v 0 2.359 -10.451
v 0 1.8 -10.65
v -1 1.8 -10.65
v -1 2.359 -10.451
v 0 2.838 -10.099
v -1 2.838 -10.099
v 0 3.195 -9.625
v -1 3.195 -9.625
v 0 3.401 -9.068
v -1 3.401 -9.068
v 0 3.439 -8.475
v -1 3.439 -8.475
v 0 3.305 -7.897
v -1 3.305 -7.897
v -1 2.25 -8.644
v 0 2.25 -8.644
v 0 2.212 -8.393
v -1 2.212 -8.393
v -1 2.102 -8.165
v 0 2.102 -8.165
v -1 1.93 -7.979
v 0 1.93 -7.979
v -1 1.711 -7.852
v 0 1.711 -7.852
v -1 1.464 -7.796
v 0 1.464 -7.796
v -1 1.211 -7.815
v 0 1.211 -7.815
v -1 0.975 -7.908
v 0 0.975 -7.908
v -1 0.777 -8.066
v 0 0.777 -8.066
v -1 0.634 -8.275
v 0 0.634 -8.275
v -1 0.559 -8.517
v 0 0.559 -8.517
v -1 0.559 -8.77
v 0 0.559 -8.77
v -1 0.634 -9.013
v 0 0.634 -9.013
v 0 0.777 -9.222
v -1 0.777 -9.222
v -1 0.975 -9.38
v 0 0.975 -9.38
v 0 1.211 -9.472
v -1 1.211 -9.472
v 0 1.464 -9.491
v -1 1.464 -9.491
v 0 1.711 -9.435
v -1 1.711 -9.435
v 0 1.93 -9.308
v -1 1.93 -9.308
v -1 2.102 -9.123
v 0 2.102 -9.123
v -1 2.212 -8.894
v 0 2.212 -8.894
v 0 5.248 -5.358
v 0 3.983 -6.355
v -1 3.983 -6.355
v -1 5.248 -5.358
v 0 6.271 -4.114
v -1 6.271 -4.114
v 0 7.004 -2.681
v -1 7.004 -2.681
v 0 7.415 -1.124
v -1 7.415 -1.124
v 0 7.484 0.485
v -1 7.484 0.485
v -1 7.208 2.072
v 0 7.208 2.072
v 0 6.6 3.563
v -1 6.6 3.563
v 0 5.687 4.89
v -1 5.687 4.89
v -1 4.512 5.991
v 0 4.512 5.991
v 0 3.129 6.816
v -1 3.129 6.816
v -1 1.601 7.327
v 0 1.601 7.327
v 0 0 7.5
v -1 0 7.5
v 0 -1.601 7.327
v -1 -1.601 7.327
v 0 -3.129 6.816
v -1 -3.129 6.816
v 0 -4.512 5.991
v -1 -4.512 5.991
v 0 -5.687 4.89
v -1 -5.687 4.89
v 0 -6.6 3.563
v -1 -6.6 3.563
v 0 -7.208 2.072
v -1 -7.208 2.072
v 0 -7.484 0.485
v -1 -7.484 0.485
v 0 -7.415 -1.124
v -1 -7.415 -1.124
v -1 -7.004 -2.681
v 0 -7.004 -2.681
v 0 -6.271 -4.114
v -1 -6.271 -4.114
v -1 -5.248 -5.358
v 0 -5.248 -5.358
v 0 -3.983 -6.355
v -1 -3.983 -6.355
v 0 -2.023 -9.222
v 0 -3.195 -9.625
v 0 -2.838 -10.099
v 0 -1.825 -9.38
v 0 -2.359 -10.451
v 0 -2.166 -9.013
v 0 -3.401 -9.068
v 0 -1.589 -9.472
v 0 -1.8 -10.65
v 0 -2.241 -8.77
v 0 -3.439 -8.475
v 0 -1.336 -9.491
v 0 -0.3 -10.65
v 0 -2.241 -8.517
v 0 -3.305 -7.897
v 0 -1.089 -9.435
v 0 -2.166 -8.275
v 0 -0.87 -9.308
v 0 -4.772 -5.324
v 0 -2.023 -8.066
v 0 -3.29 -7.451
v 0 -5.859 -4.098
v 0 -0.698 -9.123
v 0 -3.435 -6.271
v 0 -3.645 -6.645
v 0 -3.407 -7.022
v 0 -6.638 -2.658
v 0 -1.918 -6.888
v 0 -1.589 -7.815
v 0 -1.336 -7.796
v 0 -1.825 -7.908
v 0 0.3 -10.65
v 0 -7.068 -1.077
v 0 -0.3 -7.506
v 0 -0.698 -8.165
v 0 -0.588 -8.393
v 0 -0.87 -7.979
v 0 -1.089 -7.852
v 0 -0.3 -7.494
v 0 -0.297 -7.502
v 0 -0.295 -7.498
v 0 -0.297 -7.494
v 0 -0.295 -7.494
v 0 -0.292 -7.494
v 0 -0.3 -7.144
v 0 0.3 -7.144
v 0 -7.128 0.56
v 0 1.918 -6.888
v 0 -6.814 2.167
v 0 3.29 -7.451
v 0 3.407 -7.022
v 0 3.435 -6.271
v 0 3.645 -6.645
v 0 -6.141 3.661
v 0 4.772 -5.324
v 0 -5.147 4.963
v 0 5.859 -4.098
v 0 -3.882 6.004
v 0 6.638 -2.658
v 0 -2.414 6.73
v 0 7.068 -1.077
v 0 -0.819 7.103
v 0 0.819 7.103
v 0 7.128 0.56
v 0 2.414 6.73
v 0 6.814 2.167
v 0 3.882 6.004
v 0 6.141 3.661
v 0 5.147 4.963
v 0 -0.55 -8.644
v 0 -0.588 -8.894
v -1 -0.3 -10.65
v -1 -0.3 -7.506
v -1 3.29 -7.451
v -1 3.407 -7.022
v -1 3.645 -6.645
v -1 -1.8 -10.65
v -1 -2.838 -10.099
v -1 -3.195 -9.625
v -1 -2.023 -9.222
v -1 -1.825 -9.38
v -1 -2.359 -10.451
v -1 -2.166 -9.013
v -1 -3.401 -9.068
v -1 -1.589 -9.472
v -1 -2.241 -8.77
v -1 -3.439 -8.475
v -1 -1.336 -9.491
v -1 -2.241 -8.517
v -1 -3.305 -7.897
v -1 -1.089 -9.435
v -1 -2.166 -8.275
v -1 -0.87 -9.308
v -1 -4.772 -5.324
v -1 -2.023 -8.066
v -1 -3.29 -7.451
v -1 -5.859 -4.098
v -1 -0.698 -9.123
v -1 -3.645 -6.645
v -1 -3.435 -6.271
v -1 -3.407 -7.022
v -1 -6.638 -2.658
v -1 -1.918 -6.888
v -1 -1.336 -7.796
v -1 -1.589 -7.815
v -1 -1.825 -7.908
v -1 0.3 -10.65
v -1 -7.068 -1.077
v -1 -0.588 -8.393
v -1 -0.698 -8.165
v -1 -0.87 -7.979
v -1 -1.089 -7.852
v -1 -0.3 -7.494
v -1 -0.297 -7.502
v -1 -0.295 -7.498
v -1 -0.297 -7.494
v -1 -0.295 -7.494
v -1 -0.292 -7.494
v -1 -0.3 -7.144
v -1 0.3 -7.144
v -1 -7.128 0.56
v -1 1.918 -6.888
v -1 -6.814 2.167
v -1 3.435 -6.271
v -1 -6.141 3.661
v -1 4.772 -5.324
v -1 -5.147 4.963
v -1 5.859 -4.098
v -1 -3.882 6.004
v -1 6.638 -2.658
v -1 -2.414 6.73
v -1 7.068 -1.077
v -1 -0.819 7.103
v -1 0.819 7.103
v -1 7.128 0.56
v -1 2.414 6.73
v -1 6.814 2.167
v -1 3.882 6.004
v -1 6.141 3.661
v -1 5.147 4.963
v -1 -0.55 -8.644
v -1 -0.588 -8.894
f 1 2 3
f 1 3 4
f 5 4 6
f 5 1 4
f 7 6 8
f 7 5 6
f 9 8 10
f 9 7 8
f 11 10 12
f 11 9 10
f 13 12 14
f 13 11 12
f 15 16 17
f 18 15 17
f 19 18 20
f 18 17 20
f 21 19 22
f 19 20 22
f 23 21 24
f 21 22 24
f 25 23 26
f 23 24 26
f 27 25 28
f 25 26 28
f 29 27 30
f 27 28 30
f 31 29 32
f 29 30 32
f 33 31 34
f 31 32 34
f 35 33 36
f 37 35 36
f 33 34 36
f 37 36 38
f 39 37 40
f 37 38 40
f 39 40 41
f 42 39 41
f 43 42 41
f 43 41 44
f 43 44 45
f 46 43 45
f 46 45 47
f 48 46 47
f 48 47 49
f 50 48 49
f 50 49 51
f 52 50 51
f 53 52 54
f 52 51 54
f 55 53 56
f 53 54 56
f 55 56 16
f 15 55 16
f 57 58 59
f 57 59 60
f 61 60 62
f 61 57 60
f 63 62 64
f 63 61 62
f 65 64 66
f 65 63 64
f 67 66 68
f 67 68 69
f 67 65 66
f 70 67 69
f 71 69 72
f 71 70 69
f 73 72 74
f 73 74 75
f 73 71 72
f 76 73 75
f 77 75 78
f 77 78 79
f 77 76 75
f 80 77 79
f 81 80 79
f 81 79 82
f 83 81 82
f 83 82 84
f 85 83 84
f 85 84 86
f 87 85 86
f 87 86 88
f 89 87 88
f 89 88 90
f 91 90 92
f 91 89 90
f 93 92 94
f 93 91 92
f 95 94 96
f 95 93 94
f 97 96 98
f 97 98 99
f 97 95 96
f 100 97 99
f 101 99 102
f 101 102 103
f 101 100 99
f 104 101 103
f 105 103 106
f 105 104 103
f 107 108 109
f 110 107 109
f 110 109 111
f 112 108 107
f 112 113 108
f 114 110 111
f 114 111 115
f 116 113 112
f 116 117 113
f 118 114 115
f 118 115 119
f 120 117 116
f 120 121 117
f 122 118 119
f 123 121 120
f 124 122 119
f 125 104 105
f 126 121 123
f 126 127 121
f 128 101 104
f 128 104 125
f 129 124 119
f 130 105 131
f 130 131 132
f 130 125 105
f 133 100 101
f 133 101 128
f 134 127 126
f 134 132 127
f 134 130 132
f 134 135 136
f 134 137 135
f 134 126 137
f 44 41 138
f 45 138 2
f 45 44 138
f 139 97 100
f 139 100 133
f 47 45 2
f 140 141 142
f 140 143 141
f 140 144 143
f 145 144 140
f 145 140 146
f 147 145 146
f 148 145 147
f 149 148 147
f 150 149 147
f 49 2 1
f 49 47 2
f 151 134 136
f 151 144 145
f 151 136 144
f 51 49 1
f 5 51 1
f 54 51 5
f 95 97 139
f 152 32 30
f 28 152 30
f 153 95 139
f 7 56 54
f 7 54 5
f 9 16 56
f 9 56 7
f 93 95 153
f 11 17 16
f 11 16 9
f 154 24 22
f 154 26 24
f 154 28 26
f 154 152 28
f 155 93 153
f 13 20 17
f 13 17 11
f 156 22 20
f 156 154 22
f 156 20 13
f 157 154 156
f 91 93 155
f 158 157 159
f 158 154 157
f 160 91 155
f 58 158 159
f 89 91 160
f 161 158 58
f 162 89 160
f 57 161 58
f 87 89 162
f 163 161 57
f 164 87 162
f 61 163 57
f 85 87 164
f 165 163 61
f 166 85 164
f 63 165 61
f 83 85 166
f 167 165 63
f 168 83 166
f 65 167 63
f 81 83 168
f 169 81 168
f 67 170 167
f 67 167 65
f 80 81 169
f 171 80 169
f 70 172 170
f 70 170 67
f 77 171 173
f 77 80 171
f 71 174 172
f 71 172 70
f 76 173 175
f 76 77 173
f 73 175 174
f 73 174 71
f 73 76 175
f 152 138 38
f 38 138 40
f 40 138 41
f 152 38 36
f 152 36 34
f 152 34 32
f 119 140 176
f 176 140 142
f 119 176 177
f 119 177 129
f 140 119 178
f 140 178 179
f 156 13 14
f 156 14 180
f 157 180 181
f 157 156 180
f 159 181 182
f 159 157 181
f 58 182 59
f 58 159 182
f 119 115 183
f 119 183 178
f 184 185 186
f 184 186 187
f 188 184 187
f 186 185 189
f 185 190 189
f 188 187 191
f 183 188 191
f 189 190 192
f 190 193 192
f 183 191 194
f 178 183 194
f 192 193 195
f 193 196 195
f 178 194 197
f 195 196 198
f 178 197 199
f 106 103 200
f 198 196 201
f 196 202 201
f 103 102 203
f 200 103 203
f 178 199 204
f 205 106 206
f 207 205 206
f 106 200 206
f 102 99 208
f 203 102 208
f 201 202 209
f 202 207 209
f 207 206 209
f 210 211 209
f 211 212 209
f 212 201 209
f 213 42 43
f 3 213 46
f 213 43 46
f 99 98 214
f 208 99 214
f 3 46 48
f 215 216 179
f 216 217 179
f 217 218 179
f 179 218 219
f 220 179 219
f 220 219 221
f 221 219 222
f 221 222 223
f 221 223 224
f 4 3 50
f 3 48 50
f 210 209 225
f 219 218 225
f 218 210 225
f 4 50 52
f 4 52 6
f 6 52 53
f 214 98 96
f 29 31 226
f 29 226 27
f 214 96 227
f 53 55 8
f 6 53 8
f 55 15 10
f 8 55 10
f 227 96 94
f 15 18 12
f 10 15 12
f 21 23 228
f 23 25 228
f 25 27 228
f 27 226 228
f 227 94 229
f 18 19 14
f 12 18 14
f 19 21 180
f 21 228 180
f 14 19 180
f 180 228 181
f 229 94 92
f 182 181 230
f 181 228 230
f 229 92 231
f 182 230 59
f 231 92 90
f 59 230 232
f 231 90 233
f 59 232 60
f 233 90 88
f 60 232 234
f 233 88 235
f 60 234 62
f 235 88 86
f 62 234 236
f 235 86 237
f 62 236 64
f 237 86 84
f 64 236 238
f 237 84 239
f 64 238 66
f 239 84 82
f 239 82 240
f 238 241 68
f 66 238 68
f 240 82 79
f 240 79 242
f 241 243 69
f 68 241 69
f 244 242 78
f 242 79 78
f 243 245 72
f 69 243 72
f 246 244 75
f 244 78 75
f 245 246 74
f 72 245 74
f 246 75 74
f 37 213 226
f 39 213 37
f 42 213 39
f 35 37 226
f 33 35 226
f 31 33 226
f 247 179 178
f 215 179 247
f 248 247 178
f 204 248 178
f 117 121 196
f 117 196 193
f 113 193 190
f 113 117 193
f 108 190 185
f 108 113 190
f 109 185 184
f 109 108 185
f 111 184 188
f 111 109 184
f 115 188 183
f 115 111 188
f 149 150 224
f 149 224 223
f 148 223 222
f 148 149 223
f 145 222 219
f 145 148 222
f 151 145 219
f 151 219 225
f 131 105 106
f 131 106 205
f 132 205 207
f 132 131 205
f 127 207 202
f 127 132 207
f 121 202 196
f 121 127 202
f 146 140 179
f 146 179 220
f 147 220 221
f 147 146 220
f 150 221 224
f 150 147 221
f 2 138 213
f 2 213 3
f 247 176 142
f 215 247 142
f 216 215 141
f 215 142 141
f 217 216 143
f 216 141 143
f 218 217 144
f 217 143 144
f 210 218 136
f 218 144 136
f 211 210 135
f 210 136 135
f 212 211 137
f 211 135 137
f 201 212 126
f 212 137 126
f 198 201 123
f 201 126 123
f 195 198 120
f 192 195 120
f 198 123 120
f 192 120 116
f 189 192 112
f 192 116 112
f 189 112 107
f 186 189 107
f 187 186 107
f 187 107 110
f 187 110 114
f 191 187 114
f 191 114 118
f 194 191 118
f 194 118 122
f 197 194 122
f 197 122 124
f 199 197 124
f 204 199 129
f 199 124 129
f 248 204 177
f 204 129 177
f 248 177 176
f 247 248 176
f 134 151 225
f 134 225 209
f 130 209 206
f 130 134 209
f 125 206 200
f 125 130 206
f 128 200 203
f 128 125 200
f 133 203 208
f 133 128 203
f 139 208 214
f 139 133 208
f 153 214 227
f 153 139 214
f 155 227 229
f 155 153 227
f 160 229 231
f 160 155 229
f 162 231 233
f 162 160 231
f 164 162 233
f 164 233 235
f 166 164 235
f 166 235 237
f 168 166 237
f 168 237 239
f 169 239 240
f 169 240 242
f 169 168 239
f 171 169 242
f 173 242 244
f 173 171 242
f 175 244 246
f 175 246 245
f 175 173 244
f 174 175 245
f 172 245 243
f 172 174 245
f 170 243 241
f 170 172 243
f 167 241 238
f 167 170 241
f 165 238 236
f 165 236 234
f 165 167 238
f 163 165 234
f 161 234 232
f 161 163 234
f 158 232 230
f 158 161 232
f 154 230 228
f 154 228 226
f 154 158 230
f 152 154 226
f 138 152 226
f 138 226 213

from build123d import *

# Parameters (mm, degrees)
F0_R     = 0.85
F1_DEPTH = 1


with BuildPart() as f1:
    # F0 (on Right) → F1 (new body)
    with BuildSketch(Plane.YZ):
        with BuildLine():
            ThreePointArc((-0.3, -7.143704), (0, 7.15), (0.3, -7.143704))
            Line((0.3, -7.143704), (0.3, -10.65))
            Line((0.3, -10.65), (1.8, -10.65))
            ThreePointArc((1.8, -10.65), (3.195251, -9.624672), (3.304501, -7.896642))
            ThreePointArc((3.304501, -7.896642), (3.40666, -7.021654), (3.982704, -6.355161))
            ThreePointArc((3.982704, -6.355161), (0, 7.5), (-3.982704, -6.355161))
            ThreePointArc((-3.982704, -6.355161), (-3.40666, -7.021654), (-3.304501, -7.896642))
            ThreePointArc((-3.304501, -7.896642), (-3.195251, -9.624672), (-1.8, -10.65))
            Line((-1.8, -10.65), (-0.3, -10.65))
            Line((-0.3, -10.65), (-0.3, -7.505624))
            Line((-0.3, -7.505624), (-0.3, -7.493998))
            Line((-0.3, -7.493998), (-0.3, -7.143704))
        make_face()
        with Locations((-1.4, -8.643704)):
            Circle(F0_R, mode=Mode.SUBTRACT)
        with Locations((1.4, -8.643704)):
            Circle(F0_R, mode=Mode.SUBTRACT)
        with BuildLine():
            ThreePointArc((-0.292364, -7.494299), (-0.296182, -7.494149), (-0.3, -7.493998))
            Line((-0.3, -7.493998), (-0.3, -7.505624))
            ThreePointArc((-0.3, -7.505624), (-0.296191, -7.499955), (-0.292364, -7.494299))
        make_face()
    extrude(amount=-F1_DEPTH)


solid = f1.part
